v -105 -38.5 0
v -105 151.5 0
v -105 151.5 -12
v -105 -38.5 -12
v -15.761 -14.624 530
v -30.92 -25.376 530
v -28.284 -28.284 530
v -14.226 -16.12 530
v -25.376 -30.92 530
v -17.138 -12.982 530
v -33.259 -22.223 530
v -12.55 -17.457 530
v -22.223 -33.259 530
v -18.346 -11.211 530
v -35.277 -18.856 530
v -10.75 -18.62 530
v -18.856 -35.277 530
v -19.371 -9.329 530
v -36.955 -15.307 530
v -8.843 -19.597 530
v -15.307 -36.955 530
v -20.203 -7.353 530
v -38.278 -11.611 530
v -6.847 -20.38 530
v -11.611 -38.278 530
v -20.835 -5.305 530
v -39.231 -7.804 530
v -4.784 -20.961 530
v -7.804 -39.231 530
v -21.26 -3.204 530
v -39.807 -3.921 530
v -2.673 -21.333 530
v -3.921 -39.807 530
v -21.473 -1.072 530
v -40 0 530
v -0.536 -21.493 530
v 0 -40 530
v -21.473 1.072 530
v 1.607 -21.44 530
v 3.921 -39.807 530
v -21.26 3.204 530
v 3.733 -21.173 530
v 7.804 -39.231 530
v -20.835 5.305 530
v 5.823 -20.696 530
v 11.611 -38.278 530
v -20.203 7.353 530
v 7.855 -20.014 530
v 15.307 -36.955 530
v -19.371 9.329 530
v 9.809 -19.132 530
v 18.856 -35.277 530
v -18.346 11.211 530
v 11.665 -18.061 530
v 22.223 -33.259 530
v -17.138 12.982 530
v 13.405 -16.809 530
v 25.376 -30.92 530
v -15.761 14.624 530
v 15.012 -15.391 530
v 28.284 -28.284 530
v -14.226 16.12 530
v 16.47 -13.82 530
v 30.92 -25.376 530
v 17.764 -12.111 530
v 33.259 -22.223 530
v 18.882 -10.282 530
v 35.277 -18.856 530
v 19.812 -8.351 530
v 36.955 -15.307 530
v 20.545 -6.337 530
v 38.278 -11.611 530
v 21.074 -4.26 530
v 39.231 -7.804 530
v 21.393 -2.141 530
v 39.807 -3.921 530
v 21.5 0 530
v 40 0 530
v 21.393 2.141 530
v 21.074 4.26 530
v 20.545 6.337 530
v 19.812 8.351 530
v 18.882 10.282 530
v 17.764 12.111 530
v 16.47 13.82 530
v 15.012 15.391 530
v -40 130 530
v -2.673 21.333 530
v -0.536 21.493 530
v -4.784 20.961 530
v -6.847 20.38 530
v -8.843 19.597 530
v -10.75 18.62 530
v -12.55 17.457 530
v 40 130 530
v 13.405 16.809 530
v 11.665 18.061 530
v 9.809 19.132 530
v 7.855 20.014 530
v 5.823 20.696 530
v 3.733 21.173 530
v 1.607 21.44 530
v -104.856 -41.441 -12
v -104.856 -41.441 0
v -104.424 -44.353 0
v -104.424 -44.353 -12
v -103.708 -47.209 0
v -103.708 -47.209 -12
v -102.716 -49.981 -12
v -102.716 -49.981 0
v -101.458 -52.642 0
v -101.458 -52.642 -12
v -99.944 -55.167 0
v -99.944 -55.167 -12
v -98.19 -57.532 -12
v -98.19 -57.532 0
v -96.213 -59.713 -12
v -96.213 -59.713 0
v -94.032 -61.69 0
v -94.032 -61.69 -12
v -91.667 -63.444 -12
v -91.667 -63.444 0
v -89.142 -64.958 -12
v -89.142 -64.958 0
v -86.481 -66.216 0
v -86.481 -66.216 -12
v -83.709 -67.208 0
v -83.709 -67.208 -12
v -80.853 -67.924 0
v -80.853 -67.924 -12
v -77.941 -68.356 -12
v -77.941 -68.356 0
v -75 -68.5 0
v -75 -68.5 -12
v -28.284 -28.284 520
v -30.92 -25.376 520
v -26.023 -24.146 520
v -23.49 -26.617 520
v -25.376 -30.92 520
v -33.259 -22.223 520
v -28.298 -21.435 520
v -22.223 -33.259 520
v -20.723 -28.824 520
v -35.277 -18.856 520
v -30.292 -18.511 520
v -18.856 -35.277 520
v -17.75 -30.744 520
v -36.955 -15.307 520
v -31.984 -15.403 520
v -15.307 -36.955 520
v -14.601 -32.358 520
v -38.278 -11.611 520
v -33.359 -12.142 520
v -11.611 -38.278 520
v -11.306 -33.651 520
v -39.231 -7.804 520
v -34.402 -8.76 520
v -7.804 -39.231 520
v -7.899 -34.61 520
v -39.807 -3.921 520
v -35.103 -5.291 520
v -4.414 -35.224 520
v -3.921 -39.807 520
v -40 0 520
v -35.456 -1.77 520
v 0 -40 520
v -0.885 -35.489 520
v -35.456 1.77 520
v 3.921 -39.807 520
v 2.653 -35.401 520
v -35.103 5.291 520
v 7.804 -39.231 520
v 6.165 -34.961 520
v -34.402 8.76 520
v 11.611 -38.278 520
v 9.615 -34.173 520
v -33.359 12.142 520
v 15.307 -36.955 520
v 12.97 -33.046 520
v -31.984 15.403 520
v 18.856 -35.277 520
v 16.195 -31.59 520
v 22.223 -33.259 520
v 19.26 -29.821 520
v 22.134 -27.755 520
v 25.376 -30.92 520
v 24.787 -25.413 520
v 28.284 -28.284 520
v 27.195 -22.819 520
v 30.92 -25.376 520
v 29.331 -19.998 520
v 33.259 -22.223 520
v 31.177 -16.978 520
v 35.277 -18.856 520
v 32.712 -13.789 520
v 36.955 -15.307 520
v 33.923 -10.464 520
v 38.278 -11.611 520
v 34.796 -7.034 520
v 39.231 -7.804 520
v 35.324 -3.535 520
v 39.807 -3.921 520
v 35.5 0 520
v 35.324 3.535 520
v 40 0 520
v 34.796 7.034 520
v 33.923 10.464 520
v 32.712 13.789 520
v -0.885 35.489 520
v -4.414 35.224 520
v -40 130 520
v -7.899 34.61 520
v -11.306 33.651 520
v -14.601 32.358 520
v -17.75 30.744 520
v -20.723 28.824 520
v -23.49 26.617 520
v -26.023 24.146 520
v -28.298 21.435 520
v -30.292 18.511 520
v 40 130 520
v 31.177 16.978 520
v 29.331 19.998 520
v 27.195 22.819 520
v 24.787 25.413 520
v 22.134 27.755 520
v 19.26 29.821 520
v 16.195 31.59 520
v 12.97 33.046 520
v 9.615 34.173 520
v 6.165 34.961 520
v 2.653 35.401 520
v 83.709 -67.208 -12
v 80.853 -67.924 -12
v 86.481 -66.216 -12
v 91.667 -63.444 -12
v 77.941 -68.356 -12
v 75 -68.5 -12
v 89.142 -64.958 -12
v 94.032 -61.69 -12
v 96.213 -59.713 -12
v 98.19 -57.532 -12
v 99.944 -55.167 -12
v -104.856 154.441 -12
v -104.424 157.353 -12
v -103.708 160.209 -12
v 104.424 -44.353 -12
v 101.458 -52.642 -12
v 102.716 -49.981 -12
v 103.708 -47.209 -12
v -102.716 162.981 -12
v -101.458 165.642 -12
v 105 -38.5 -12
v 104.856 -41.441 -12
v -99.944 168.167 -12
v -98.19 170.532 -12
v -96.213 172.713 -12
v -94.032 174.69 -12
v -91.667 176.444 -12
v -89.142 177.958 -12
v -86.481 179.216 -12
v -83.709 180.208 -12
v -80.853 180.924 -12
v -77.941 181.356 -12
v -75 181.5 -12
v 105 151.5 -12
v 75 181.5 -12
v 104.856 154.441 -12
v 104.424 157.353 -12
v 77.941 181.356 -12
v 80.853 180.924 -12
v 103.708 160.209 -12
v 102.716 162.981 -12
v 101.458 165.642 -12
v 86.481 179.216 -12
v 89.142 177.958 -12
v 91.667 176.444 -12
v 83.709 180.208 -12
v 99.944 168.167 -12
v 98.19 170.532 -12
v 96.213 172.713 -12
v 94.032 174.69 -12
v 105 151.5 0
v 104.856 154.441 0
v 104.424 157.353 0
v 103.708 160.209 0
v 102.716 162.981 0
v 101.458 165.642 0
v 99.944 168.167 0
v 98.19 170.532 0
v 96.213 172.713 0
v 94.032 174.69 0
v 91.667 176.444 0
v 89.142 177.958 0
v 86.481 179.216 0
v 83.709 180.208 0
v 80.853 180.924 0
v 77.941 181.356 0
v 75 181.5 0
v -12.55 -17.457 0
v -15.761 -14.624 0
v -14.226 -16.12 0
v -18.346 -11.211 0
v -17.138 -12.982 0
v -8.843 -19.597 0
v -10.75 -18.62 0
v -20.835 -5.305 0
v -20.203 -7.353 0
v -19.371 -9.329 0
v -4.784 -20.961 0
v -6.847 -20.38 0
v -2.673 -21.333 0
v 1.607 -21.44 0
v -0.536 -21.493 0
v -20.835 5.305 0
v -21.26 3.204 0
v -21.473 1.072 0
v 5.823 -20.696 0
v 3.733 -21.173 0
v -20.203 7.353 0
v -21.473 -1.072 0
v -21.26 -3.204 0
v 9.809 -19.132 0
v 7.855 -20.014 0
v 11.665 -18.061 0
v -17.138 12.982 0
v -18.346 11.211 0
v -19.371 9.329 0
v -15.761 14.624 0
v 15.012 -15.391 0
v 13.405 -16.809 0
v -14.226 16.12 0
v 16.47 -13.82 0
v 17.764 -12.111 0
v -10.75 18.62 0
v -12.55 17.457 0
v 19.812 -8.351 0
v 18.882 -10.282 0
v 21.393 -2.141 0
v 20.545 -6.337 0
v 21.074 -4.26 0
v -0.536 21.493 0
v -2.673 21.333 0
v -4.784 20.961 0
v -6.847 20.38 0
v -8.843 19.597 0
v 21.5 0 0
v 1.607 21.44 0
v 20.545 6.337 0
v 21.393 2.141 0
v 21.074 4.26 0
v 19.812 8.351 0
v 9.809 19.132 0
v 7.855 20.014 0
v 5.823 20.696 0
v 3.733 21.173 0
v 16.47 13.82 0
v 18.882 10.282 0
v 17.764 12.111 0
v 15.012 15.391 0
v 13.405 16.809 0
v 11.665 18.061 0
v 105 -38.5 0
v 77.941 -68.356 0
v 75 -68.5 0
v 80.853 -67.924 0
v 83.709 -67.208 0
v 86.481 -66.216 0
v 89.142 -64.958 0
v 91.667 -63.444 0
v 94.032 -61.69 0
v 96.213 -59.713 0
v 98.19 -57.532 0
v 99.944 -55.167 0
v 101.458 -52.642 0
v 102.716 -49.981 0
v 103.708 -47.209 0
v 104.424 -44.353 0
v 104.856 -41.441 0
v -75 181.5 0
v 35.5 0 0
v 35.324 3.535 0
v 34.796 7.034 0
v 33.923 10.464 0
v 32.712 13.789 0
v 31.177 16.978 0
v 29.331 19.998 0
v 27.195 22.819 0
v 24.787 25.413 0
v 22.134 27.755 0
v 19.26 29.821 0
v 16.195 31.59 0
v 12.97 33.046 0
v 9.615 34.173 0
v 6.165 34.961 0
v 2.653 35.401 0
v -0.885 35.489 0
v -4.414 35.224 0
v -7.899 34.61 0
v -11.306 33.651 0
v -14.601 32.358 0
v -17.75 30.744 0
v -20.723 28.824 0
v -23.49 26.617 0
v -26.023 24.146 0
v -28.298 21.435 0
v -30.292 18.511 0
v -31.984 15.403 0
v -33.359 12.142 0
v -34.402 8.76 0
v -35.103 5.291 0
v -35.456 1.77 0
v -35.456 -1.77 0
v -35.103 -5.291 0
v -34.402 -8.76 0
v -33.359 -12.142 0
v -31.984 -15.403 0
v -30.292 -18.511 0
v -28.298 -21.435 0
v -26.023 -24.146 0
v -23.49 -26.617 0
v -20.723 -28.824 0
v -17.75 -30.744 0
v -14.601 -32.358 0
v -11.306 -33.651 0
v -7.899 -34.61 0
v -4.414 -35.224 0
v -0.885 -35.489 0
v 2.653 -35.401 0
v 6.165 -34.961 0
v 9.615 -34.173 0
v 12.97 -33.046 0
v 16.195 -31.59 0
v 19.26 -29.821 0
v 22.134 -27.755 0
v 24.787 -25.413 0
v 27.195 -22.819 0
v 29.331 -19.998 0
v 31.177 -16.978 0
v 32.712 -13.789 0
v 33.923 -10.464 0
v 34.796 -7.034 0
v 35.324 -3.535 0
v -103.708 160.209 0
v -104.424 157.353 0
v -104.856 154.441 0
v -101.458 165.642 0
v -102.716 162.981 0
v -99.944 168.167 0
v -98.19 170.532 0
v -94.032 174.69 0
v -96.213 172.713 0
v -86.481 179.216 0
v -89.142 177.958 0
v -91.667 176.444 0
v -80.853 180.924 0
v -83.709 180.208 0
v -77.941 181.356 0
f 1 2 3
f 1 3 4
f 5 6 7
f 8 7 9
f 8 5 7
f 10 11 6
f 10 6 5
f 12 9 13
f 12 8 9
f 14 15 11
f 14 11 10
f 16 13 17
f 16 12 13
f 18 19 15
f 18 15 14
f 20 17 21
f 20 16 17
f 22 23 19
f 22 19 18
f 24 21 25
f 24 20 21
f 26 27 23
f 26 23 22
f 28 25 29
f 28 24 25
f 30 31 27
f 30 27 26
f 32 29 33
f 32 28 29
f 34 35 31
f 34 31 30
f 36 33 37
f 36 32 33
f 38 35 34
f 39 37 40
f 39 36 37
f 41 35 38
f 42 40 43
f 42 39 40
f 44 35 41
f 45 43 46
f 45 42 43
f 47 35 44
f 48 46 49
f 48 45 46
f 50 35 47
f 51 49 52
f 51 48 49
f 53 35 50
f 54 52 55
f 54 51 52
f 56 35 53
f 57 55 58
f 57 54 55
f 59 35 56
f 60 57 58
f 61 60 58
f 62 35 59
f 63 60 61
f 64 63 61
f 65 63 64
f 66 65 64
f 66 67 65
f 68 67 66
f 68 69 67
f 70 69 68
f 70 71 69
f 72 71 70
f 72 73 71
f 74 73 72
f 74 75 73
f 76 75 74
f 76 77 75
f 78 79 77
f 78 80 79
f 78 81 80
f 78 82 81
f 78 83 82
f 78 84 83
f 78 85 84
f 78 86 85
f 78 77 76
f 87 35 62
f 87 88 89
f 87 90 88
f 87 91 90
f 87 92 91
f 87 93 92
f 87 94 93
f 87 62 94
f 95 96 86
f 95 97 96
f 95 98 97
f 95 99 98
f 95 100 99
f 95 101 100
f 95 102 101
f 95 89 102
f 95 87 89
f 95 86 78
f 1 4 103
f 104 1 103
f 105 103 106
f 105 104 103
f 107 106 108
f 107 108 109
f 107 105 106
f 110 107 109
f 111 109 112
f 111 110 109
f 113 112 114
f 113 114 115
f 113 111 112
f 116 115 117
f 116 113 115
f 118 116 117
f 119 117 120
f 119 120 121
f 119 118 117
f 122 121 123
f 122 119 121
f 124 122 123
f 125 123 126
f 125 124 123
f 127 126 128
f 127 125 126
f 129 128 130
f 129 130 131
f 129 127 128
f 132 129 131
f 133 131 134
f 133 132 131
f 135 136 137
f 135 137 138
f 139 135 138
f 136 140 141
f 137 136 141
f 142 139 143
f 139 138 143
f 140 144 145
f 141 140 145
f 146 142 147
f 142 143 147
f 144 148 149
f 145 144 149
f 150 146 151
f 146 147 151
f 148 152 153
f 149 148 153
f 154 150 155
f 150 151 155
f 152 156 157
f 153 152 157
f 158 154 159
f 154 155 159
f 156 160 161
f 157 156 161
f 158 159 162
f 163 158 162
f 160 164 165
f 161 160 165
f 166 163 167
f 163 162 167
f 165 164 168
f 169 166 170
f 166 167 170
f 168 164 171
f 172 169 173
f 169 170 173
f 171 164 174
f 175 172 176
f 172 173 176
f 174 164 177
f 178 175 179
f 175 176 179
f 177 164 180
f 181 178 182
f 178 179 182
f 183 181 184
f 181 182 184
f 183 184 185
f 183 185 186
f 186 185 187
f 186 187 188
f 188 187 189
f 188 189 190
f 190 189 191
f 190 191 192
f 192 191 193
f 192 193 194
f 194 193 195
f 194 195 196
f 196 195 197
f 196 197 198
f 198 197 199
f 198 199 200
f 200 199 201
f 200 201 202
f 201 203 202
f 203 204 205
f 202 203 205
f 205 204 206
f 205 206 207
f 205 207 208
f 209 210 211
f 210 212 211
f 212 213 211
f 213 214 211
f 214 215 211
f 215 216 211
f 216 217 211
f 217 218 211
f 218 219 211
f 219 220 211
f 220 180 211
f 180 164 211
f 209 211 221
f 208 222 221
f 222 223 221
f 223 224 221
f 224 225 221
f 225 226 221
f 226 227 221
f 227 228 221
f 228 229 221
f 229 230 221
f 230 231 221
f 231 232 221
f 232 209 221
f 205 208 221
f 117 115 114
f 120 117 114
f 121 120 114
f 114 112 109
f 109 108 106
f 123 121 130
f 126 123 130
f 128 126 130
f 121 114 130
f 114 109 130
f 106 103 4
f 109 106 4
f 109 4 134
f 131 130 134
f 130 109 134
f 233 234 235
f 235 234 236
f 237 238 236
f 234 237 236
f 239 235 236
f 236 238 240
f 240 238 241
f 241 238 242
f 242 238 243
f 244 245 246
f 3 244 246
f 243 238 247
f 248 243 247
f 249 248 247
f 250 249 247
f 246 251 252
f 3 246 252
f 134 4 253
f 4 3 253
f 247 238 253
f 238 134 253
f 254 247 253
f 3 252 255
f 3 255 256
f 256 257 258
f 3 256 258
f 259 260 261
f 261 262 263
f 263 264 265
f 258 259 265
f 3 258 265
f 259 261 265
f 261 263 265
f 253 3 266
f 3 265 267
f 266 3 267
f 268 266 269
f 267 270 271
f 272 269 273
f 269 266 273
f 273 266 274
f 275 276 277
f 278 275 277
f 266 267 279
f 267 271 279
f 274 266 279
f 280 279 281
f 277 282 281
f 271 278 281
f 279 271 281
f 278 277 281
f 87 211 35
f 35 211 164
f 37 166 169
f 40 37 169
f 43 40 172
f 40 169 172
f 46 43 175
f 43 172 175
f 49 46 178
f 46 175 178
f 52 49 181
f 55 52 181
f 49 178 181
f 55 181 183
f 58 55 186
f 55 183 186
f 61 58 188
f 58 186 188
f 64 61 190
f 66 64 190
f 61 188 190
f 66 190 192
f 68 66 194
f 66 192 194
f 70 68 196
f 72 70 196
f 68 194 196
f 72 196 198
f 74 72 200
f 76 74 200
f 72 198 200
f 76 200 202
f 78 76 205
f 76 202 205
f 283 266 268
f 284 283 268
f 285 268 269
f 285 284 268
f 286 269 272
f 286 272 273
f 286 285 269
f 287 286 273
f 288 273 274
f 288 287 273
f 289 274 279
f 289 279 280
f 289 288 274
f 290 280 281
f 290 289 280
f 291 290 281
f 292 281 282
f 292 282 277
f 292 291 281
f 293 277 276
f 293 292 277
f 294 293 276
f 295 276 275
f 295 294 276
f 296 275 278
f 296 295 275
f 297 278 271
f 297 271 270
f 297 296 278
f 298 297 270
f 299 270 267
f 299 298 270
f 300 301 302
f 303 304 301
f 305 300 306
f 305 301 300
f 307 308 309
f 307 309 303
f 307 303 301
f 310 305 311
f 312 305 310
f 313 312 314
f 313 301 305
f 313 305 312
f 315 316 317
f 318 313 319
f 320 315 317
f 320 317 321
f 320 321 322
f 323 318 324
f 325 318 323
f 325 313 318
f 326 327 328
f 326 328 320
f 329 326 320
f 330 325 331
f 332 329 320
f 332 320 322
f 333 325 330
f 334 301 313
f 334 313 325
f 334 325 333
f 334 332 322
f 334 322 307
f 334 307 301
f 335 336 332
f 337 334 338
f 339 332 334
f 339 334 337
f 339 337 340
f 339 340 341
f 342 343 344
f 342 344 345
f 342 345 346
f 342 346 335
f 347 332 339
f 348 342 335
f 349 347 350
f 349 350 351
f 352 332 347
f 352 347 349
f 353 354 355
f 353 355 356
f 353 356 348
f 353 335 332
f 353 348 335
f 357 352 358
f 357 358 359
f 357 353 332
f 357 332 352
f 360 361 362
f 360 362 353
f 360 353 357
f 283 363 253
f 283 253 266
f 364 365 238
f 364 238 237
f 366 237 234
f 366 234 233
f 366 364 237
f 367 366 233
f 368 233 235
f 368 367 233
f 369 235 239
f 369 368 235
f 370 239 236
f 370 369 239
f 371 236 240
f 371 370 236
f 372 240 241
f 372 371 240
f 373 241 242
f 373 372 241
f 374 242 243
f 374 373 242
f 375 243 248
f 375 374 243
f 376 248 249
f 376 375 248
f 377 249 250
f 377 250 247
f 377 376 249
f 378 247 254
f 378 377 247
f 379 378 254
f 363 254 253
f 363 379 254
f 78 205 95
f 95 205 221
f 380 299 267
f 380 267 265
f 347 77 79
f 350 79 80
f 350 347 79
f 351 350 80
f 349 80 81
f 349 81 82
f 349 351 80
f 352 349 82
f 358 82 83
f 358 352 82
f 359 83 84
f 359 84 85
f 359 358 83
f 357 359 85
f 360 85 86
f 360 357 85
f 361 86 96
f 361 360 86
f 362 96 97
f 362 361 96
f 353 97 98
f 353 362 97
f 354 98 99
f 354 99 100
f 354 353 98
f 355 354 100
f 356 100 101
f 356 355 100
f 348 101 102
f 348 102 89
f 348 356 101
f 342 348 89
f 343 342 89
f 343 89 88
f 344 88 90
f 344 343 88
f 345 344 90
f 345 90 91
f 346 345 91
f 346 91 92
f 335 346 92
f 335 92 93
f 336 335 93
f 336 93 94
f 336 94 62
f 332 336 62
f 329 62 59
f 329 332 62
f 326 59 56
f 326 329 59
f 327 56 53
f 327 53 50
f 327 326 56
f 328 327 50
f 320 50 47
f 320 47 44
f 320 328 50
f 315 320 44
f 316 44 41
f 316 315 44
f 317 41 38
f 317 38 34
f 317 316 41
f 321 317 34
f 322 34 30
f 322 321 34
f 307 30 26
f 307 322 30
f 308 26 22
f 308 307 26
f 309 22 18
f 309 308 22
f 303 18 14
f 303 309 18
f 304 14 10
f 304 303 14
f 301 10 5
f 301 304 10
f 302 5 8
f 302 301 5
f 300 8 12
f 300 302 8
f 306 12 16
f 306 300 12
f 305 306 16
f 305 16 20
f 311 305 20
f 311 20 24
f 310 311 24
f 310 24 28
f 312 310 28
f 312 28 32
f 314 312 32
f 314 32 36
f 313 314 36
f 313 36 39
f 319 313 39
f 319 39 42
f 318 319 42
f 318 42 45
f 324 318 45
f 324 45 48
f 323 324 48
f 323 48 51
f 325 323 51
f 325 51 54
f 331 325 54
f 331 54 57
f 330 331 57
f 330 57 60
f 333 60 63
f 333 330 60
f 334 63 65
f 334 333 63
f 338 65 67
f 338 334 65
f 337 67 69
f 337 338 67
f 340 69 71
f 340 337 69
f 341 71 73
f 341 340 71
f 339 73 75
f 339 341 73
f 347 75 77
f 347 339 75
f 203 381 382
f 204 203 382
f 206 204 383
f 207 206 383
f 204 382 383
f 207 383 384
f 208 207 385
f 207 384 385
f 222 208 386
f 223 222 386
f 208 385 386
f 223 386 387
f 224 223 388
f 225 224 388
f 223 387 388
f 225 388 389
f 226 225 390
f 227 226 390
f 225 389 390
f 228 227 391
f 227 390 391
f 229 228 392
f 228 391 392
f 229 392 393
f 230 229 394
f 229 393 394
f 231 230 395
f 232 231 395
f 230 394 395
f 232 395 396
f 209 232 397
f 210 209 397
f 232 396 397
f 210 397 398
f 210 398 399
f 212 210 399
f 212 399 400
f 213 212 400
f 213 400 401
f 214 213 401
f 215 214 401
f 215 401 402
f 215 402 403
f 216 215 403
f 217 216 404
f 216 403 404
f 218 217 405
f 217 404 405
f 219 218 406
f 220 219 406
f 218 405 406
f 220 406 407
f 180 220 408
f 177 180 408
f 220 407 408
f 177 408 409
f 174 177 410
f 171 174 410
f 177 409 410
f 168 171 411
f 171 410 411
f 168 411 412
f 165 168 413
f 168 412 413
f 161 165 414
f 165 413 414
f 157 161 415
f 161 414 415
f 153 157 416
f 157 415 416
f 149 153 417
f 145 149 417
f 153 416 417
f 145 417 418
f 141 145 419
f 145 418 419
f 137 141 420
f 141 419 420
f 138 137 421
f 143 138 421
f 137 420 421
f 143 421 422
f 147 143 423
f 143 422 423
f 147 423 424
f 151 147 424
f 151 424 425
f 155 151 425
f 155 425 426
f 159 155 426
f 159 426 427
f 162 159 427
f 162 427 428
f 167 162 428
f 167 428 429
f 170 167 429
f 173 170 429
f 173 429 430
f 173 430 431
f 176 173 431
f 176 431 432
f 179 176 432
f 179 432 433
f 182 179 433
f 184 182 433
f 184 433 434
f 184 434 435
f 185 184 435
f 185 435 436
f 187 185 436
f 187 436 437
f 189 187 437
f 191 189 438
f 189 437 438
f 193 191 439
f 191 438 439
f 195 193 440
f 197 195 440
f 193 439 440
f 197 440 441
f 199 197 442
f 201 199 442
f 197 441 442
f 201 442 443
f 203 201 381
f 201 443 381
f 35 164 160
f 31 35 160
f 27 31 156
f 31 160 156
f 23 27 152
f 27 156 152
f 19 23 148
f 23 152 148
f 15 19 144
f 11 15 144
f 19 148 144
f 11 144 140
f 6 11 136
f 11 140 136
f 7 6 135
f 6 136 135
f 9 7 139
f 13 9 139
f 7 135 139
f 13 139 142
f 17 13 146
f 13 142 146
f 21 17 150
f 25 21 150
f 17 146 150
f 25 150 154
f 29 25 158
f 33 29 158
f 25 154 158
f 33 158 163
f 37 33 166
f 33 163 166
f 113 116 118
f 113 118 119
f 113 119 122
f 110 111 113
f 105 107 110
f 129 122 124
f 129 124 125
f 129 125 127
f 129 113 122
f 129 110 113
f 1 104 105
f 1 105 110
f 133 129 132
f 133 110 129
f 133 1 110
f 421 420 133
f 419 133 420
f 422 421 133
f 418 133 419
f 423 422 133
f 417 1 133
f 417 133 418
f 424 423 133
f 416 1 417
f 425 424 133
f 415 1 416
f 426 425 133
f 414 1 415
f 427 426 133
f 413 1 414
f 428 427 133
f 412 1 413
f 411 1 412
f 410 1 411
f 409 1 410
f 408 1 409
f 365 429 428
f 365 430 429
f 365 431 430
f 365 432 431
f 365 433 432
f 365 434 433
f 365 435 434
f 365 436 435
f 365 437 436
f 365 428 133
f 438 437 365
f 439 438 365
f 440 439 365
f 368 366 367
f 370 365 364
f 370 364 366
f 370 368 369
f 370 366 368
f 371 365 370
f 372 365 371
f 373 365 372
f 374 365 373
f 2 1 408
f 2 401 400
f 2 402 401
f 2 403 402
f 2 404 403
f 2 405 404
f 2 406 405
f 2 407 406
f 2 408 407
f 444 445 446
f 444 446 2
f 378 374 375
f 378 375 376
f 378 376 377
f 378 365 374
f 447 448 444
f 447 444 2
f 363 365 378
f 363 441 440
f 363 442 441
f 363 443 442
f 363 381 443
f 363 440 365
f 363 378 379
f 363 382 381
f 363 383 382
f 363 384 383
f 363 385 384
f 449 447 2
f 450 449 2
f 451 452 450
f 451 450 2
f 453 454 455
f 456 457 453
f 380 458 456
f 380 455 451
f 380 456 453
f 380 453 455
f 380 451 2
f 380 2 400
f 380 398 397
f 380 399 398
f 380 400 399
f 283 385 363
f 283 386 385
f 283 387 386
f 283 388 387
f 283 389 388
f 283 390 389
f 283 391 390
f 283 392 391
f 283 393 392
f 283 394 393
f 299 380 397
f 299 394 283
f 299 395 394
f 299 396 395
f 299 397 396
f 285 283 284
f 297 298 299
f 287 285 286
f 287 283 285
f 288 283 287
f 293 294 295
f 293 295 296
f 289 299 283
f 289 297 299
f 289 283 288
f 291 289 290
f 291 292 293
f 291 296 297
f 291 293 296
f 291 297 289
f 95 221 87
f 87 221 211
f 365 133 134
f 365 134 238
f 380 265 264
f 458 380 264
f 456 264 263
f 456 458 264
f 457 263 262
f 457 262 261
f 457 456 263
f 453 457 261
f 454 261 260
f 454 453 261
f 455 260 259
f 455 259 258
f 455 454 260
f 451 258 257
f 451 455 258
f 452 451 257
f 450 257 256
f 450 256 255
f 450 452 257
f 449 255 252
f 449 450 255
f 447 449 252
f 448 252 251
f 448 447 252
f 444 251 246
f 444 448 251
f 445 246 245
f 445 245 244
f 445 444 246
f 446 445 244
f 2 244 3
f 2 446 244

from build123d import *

# Parameters (mm, degrees)
F0_R     = 35.5
F0_R_2   = 21.5
F1_DEPTH = 12
F2_DEPTH = 520
F3_R     = 35.5
F3_R_2   = 21.5
F4_DEPTH = 10


with BuildPart() as f1:
    # F0 (on Top) → F1 (new body)
    with BuildSketch(Plane.XY):
        with BuildLine():
            Line((75, 181.5), (-75, 181.5))
            ThreePointArc((-75, 181.5), (-96.213203, 172.713203), (-105, 151.5))
            Line((-105, 151.5), (-105, -38.5))
            ThreePointArc((-105, -38.5), (-96.213203, -59.713203), (-75, -68.5))
            Line((-75, -68.5), (75, -68.5))
            ThreePointArc((75, -68.5), (96.213203, -59.713203), (105, -38.5))
            Line((105, -38.5), (105, 151.5))
            ThreePointArc((105, 151.5), (96.213203, 172.713203), (75, 181.5))
        make_face()
        Circle(F0_R, mode=Mode.SUBTRACT)
        Circle(F0_R)
        Circle(F0_R_2, mode=Mode.SUBTRACT)
        Circle(F0_R_2)
    extrude(amount=-F1_DEPTH)

    # F0 (on Top) → F2 (join)
    with BuildSketch(Plane.XY):
        Circle(F0_R)
        Circle(F0_R_2, mode=Mode.SUBTRACT)
    extrude(amount=F2_DEPTH)

    # F3 (on face) → F4 (join)
    with BuildSketch(Plane.XY.offset(520)):
        with BuildLine():
            Line((40, 130), (-40, 130))
            Line((-40, 130), (-40, 0))
            ThreePointArc((-40, 0), (-28.284271, -28.284271), (0, -40))
            ThreePointArc((0, -40), (28.284271, -28.284271), (40, 0))
            Line((40, 0), (40, 130))
        make_face()
        Circle(F3_R, mode=Mode.SUBTRACT)
        Circle(F3_R)
        Circle(F3_R_2, mode=Mode.SUBTRACT)
    extrude(amount=F4_DEPTH)


solid = f1.part
